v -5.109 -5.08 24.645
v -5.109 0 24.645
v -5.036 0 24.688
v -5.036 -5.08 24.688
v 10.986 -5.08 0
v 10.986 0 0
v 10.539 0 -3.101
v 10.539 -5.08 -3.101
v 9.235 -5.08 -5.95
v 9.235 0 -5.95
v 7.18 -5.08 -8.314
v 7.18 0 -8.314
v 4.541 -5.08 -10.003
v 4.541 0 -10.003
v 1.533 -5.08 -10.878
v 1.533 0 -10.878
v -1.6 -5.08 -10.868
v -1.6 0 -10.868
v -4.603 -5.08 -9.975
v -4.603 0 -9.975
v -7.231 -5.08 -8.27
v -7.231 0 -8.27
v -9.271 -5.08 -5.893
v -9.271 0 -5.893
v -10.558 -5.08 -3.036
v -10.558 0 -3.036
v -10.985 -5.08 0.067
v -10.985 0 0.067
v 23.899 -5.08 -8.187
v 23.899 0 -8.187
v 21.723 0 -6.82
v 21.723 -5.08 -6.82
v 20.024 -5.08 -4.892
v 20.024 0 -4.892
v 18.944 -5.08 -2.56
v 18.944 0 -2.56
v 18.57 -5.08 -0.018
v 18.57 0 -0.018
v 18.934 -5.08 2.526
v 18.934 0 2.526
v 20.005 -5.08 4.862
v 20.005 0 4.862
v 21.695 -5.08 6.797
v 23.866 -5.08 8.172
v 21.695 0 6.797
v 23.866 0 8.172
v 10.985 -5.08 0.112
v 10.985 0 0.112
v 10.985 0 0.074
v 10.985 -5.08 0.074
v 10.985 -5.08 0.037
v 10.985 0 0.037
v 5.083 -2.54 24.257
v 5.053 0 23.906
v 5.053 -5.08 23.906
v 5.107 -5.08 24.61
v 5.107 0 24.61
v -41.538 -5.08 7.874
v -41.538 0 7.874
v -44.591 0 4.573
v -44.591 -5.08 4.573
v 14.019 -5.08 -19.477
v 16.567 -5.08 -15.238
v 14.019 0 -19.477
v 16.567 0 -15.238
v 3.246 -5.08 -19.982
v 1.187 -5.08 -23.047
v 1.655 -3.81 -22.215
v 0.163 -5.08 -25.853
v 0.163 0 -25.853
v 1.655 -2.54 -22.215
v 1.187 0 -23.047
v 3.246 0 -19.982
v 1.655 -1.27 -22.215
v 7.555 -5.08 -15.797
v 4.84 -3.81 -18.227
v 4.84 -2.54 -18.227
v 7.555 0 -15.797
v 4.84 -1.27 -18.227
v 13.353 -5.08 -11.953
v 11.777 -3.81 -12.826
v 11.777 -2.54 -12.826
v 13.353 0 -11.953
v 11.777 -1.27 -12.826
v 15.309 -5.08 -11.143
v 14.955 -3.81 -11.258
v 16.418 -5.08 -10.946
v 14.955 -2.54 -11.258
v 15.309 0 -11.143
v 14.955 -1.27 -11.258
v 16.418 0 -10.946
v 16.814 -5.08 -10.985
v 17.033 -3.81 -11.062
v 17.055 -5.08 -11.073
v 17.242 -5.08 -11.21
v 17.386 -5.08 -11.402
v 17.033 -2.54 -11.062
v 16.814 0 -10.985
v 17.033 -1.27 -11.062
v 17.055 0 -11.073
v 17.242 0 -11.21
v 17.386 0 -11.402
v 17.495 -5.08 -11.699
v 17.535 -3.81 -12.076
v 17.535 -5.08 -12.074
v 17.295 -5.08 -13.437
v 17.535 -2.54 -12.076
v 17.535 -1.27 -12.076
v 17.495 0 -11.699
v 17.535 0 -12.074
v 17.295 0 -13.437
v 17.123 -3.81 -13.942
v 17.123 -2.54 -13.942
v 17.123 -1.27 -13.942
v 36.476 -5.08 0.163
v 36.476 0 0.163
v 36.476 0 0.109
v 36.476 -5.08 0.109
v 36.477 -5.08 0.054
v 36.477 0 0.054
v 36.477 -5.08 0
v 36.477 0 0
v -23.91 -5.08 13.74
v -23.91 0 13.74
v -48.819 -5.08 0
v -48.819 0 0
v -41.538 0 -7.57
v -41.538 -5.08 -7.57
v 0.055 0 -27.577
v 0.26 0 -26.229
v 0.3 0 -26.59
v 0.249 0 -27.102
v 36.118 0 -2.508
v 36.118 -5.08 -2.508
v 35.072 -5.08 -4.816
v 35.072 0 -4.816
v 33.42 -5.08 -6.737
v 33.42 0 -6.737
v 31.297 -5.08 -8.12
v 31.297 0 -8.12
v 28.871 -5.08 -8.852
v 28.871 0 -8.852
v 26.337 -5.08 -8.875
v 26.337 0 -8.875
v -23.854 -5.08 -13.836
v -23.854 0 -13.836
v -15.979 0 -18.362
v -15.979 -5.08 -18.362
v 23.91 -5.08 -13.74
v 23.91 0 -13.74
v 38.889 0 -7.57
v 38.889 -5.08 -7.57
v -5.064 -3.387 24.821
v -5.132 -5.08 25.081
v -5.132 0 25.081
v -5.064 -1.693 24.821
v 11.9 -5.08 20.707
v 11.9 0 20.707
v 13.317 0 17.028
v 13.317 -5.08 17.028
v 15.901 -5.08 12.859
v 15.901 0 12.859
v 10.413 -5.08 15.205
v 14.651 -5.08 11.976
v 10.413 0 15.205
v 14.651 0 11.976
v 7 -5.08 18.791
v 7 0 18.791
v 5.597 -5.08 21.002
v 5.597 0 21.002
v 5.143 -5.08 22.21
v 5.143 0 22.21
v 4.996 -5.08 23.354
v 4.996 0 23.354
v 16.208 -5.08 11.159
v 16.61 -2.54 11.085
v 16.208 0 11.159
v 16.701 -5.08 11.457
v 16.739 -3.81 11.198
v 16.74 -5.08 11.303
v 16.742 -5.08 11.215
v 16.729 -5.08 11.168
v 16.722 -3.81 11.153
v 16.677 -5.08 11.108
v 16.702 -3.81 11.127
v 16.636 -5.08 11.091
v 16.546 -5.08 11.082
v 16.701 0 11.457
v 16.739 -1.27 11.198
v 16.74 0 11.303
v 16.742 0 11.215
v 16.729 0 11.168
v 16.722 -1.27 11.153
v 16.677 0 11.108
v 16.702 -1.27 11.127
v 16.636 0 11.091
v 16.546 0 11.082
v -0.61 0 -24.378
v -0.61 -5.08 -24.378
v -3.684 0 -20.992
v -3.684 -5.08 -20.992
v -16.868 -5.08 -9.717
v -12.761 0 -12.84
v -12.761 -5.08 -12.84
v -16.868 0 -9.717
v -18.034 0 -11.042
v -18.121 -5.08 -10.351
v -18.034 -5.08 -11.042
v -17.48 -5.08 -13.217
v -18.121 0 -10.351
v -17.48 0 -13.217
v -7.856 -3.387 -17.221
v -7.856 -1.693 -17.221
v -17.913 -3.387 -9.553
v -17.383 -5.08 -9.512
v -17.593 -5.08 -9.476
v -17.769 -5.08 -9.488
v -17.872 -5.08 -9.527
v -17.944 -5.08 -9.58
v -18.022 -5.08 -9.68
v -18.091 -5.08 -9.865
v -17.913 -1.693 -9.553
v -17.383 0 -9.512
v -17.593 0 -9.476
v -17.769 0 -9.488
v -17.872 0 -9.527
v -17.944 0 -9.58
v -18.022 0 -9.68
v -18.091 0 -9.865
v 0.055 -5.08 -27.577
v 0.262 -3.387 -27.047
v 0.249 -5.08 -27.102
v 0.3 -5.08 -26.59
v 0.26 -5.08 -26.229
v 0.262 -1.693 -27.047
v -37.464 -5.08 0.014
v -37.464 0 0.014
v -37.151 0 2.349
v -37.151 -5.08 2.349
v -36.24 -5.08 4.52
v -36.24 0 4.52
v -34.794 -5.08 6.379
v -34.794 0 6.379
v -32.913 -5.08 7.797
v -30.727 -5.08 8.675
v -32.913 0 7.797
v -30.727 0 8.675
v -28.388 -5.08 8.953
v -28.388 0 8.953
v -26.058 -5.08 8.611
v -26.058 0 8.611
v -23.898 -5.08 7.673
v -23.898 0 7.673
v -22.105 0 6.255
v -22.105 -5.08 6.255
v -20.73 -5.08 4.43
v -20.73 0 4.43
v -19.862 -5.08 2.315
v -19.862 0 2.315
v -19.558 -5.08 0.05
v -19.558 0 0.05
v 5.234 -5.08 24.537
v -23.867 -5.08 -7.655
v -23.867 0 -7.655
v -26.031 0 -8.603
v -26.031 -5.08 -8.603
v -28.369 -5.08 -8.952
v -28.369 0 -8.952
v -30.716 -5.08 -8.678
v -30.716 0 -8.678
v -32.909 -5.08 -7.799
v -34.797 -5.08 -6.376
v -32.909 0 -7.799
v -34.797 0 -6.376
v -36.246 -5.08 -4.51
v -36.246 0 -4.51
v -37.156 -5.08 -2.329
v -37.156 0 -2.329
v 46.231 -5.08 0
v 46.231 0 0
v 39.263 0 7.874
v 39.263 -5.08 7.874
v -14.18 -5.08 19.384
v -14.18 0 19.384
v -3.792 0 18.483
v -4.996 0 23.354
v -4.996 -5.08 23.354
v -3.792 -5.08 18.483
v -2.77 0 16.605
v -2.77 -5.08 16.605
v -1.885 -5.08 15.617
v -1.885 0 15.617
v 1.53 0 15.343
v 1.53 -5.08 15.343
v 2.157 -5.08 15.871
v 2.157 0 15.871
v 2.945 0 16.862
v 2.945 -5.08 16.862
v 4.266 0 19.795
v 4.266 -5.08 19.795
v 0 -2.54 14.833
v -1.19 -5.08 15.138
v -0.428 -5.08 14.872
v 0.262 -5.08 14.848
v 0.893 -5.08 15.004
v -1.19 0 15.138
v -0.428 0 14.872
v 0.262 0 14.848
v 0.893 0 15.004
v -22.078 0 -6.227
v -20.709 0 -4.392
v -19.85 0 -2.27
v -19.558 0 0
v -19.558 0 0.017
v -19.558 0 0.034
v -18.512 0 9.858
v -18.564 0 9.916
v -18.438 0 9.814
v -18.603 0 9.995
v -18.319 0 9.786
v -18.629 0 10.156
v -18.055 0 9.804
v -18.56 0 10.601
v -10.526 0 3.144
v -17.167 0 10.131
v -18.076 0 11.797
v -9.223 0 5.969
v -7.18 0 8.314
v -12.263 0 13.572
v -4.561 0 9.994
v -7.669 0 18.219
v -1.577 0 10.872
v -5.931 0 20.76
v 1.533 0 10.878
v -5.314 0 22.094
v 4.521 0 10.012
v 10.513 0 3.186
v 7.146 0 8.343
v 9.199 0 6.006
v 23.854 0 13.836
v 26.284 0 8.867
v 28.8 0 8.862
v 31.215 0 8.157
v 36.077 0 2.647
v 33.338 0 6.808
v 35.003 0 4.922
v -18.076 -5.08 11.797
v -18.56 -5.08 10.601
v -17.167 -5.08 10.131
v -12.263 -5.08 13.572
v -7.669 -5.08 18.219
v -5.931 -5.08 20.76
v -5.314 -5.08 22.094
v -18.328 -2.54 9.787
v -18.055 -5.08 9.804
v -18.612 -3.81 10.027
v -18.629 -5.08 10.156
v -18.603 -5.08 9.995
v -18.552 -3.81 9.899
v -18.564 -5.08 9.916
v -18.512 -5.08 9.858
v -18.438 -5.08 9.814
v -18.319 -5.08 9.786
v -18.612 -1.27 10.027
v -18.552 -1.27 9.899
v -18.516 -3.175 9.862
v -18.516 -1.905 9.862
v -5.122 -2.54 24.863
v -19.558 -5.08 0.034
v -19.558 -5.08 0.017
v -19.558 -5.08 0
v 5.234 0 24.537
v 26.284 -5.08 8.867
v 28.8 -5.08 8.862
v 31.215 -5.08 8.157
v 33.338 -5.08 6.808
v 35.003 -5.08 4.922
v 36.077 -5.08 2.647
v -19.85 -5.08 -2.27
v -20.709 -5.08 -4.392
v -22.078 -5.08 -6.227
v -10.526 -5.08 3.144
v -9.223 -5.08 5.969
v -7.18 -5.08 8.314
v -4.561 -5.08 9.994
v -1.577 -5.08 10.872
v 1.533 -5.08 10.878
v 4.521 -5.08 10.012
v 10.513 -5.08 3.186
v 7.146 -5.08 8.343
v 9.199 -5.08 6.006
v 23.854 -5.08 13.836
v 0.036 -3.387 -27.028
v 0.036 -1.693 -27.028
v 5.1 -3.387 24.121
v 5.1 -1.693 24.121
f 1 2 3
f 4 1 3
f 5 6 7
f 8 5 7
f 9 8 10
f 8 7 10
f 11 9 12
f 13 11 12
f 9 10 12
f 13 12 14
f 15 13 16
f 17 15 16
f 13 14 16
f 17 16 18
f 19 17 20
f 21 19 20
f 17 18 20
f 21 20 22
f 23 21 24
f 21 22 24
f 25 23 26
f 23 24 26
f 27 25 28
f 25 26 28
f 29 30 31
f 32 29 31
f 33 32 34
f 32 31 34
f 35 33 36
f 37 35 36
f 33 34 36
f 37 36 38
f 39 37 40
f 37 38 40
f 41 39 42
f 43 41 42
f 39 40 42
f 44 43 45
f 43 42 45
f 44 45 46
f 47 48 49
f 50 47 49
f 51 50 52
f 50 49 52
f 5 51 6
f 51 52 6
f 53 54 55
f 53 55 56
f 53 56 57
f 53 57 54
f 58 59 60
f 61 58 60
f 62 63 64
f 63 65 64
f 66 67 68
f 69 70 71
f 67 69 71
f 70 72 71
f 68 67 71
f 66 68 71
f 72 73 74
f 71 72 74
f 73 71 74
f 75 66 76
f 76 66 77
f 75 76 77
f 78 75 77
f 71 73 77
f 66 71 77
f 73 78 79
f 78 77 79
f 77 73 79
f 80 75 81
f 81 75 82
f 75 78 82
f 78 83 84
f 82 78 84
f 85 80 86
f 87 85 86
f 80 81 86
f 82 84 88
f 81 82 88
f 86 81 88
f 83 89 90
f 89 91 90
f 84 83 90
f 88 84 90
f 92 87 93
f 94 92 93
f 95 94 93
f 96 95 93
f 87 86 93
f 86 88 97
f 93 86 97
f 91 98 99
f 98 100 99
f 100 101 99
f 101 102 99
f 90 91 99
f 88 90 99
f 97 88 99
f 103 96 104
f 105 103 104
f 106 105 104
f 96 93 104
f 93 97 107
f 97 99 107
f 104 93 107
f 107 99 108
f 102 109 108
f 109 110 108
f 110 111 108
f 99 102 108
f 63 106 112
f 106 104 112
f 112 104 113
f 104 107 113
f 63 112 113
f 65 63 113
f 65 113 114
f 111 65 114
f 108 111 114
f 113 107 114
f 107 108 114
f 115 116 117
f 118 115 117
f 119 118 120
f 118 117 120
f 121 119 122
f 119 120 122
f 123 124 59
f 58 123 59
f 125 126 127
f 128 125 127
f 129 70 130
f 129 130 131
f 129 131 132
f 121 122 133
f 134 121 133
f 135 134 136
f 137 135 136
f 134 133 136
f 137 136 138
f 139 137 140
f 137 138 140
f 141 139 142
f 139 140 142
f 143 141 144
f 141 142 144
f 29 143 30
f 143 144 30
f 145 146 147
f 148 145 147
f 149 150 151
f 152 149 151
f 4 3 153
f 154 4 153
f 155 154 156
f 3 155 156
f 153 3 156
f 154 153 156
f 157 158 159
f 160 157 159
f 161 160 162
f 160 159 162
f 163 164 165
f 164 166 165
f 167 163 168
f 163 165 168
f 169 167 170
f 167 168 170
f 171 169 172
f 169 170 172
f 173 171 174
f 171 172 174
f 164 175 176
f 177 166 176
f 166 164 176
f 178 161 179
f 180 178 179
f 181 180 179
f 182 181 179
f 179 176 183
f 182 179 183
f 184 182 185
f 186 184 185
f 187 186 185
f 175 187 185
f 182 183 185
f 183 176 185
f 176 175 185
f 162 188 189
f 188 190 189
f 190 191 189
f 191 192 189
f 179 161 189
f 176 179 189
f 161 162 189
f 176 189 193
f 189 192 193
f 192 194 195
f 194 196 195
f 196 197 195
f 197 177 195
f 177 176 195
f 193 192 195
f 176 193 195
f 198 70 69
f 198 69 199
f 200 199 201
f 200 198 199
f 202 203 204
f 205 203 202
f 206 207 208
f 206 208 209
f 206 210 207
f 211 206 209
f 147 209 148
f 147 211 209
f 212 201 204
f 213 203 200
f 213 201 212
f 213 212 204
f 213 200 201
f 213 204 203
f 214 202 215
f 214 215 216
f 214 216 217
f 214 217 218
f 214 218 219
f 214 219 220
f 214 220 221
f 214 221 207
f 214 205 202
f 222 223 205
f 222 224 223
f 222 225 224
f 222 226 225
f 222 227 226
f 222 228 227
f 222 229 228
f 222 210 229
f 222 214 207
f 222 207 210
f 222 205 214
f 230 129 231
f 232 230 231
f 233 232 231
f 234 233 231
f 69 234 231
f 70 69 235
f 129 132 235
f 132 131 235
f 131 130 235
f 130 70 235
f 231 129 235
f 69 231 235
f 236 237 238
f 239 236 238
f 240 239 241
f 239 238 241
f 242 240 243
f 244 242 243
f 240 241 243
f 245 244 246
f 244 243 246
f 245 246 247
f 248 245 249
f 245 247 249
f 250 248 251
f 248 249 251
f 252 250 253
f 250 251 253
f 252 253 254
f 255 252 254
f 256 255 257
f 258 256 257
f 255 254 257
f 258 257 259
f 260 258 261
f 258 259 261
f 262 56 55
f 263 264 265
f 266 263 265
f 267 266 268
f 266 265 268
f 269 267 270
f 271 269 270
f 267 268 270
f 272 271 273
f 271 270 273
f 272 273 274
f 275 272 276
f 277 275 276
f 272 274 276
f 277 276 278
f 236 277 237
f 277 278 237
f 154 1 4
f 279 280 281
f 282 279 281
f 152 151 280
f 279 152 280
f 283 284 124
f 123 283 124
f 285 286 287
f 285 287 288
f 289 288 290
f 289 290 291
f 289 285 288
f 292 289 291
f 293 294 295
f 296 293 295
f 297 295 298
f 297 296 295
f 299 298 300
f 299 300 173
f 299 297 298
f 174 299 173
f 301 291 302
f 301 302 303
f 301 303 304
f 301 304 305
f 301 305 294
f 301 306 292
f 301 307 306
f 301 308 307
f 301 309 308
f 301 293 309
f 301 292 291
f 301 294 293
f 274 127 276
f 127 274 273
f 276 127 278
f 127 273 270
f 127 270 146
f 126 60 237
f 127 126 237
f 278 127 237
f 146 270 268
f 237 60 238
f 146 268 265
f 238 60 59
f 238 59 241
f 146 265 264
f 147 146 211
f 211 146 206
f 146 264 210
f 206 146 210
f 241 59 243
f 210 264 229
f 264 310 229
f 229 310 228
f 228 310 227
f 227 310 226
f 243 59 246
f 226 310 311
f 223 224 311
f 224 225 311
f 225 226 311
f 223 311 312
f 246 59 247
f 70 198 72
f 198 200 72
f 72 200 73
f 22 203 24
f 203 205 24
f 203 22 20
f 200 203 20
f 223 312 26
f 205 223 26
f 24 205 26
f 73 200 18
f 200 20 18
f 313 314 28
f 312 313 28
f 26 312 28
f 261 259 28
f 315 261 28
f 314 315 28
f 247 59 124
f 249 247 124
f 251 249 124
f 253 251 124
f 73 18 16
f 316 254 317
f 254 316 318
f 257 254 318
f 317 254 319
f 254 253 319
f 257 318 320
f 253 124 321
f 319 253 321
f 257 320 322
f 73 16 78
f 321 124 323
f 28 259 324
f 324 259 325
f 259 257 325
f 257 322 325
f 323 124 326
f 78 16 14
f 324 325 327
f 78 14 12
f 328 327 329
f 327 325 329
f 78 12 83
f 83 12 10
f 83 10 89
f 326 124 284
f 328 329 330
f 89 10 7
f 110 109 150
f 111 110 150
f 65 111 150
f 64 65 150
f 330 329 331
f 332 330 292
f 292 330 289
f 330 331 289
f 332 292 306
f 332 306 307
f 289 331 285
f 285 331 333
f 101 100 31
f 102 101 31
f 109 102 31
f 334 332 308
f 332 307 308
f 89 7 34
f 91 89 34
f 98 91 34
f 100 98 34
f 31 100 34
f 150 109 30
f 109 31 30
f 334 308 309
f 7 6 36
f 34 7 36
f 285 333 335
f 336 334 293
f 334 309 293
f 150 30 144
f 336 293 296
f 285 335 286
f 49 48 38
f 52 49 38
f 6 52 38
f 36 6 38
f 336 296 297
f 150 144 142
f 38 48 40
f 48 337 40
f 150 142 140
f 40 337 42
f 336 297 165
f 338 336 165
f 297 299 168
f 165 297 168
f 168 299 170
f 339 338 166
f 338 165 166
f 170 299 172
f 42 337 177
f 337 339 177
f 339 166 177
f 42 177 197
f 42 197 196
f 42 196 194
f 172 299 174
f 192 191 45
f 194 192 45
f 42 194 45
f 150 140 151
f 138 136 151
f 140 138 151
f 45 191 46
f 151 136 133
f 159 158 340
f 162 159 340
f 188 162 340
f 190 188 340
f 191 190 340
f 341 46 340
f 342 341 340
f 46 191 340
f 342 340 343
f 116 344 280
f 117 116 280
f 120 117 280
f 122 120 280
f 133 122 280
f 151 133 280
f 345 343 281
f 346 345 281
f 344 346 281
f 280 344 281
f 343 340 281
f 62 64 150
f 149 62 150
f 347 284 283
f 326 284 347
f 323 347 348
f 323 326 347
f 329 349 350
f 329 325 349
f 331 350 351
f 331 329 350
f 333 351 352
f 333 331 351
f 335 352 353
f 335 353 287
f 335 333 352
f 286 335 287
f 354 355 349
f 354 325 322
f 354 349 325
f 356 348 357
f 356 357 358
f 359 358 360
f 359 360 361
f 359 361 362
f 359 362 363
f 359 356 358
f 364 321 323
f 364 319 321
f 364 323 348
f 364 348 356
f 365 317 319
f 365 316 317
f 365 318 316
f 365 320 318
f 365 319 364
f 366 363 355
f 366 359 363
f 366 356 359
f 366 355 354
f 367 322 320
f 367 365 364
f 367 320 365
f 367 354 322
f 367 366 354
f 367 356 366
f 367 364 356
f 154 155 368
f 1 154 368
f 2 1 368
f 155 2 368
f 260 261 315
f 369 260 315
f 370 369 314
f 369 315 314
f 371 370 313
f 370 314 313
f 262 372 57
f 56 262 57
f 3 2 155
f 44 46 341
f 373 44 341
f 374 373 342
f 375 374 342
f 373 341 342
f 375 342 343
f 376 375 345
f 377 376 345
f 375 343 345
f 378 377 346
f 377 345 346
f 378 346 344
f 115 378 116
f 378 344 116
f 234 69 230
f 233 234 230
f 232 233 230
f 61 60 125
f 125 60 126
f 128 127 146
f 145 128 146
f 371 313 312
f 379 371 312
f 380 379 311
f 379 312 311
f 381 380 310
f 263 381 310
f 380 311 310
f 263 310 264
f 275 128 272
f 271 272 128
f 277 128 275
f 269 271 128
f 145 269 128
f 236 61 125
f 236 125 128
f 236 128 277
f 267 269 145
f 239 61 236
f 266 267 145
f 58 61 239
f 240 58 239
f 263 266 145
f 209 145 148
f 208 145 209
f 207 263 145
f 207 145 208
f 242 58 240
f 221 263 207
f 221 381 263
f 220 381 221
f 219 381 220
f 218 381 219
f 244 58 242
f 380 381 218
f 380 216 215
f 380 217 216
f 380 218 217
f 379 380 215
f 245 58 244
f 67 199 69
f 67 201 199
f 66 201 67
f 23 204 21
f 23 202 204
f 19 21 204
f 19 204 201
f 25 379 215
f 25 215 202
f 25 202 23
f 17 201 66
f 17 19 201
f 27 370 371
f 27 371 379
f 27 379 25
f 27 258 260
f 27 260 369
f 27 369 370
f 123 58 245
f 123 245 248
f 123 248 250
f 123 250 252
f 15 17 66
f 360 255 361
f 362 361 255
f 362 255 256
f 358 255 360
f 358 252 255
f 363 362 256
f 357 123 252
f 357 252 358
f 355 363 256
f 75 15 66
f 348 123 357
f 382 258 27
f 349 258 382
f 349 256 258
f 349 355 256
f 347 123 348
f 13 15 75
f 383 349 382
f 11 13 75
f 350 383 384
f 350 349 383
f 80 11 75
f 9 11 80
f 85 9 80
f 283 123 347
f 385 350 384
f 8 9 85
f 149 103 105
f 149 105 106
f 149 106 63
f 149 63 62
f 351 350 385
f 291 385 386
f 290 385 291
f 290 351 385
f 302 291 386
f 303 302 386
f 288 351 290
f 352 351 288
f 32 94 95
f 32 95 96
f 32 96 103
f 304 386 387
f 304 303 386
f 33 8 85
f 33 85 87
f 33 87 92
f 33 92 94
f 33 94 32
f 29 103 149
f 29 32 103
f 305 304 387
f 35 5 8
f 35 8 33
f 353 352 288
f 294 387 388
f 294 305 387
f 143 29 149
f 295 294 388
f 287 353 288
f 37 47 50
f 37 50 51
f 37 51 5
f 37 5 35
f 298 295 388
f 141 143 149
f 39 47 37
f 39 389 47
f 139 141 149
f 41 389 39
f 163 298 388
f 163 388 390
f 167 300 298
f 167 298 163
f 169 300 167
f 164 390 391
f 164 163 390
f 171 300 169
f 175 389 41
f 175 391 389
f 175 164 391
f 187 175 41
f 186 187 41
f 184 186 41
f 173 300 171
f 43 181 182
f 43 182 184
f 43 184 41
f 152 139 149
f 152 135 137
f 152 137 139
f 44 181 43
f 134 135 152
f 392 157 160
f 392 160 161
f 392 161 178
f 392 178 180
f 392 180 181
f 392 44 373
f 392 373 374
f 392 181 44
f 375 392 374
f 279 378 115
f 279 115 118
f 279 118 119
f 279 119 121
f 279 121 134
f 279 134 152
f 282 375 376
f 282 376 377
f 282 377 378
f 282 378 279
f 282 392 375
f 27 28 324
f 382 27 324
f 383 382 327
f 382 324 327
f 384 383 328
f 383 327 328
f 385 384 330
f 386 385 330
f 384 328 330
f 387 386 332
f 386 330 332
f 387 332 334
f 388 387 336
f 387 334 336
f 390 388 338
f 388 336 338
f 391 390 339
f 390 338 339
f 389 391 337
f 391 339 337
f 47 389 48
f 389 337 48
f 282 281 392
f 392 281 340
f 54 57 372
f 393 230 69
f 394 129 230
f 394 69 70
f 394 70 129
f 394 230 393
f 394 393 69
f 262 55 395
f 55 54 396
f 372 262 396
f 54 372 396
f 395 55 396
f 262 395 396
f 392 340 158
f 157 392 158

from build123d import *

# Parameters (mm, degrees)
F1_DEPTH = 5.08


with BuildPart() as f1:
    # F0 (on Front) → F1 (new body)
    with BuildSketch(Plane.XZ):
        with BuildLine():
            Line((23.8544226128, 13.8363139495), (11.8995172721, 20.7065034498))
            add(Edge.make_bspline(
                [(11.8995172721, 20.7065034498), (12.7527047238, 16.3214990301), (23.6984449015, 4.8622046649), (4.8911049153, 18.4580126576), (4.9955159434, 23.3538565741)],
                knots=[0, 0, 0, 0, 0.2510815361, 0.566393336, 0.566393336, 0.566393336, 0.566393336], degree=3))
            add(Edge.make_bspline(
                [(-4.9955159434, 23.3538565741), (-4.0065950779, 14.8329585791), (0, 14.8329585791), (4.0065950779, 14.8329585791), (4.9955159434, 23.3538565741)],
                knots=[1.8201970434, 1.8201970434, 1.8201970434, 3.1415926536, 3.1415926536, 4.4629882638, 4.4629882638, 4.4629882638], degree=2, weights=[1, 0.7895642031, 1, 0.7895642031, 1]))
            add(Edge.make_bspline(
                [(-14.1796024948, 19.3842051979), (-16.1087852311, 14.8596253569), (-24.5159632533, 3.3211353455), (-5.6744217692, 18.0019188802), (-4.9955159434, 23.3538565741)],
                knots=[0, 0, 0, 0, 0.2419326445, 0.5682555357, 0.5682555357, 0.5682555357, 0.5682555357], degree=3))
            Line((-14.1796024948, 19.3842051979), (-23.9098106814, 13.7403790006))
            Line((-23.9098106814, 13.7403790006), (-23.8976251995, 7.6734533511))
            ThreePointArc((-23.8976251995, 7.6734533511), (-20.730112215, 4.4297703221), (-19.5576464714, 0.0502792352))
            Line((-19.5576464714, 0.0502792352), (-10.9852926415, 0.0674968952))
            ThreePointArc((-10.9852926415, 0.0674968952), (-0.0220644441, 10.9854778417), (10.9849328747, 0.1116243169))
            Line((10.9849328747, 0.1116243169), (18.5708946822, 0.1268607984))
            ThreePointArc((18.5708946822, 0.1268607984), (20.0443809343, 4.922194791), (23.8657988515, 8.1722955491))
            Line((23.8657988515, 8.1722955491), (23.8544226128, 13.8363139495))
        make_face()
        with BuildLine():
            Line((39.2630137504, 7.8735761344), (23.8544226128, 13.8363139495))
            Line((23.8544226128, 13.8363139495), (23.8657988515, 8.1722955491))
            ThreePointArc((23.8657988515, 8.1722955491), (32.3240559978, 7.557763228), (36.4755152887, 0.1628224112))
            Line((36.4755152887, 0.1628224112), (41.5712800692, 0.1730573066))
            Line((41.5712800692, 0.1730573066), (41.5622201778, 4.6838093397))
            Line((41.5622201778, 4.6838093397), (39.2630137504, 7.8735761344))
        make_face()
        Polygon((46.2305024266, 0), (39.2630137504, 7.8735761344), (41.5622201778, 4.6838093397), (41.5712800692, 0.1730573066), (41.5716276565, 0), (38.8891281875, -7.569654379), align=None)
        with BuildLine():
            Line((41.5712800692, 0.1730573066), (36.4755152887, 0.1628224112))
            ThreePointArc((36.4755152887, 0.1628224112), (36.4766257405, 0.0814145715), (36.4769959013, 0))
            ThreePointArc((36.4769959013, 0), (32.4076622958, -7.504004323), (23.8986565077, -8.1869225977))
            Line((23.8986565077, -8.1869225977), (23.9098106814, -13.7403790006))
            Line((23.9098106814, -13.7403790006), (38.8891281875, -7.569654379))
            Line((38.8891281875, -7.569654379), (41.5716276565, 0))
            Line((41.5716276565, 0), (41.5712800692, 0.1730573066))
        make_face()
        with BuildLine():
            ThreePointArc((23.8986565077, -8.1869225977), (19.9850775207, -4.830880931), (18.5708946822, 0.1268607984))
            Line((18.5708946822, 0.1268607984), (10.9849328747, 0.1116243169))
            ThreePointArc((10.9849328747, 0.1116243169), (10.9853582178, 0.0558128788), (10.9855, 0))
            ThreePointArc((10.9855, 0), (-0.0337486069, -10.9854481602), (-10.9852926415, 0.0674968952))
            Line((-10.9852926415, 0.0674968952), (-19.5576464714, 0.0502792352))
            ThreePointArc((-19.5576464714, 0.0502792352), (-19.5575405901, 0.0251397167), (-19.5575052963, 0))
            ThreePointArc((-19.5575052963, 0), (-20.7088673521, -4.3922438172), (-23.8668381271, -7.6548594732))
            Line((-23.8668381271, -7.6548594732), (-23.8544226128, -13.8363139495))
            Line((-23.8544226128, -13.8363139495), (-15.9790920253, -18.3620723701))
            add(Edge.make_bspline(
                [(0.163388369, -25.8532824823), (-0.5824883081, -23.5445287745), (-8.8142073886, -16.5809605771), (-20.7736627649, -5.1912645148), (-16.9995624931, -14.3564310957), (-15.9790920253, -18.3620723701)],
                knots=[0.0461674631, 0.0461674631, 0.0461674631, 0.0461674631, 0.2131983653, 0.4232173263, 0.6005724186, 0.6005724186, 0.6005724186, 0.6005724186], degree=3))
            add(Edge.make_bspline(
                [(0.163388369, -25.8532824823), (0.5984234349, -23.6166229337), (4.4335734026, -16.9603900208), (20.3472971341, -7.0641553228), (16.8185248338, -15.4600803358), (14.0872810007, -19.3800999399), (14.0188094193, -19.4774702293)],
                knots=[0.0441354144, 0.0441354144, 0.0441354144, 0.0441354144, 0.2056976035, 0.4443926766, 0.6304870786, 0.6352232986, 0.6352232986, 0.6352232986, 0.6352232986], degree=3))
            Line((14.0188094193, -19.4774702293), (23.9098106814, -13.7403790006))
            Line((23.9098106814, -13.7403790006), (23.8986565077, -8.1869225977))
        make_face()
        with BuildLine():
            Line((-23.8976251995, 7.6734533511), (-23.9098106814, 13.7403790006))
            Line((-23.9098106814, 13.7403790006), (-41.5380969644, 7.8735761344))
            Line((-41.5380969644, 7.8735761344), (-44.5907459629, 4.5725049953))
            Line((-44.5907459629, 4.5725049953), (-44.5907459629, 0))
            Line((-44.5907459629, 0), (-37.4644938557, 0.0143131499))
            ThreePointArc((-37.4644938557, 0.0143131499), (-32.9126802641, 7.7968211297), (-23.8976251995, 7.6734533511))
        make_face()
        with BuildLine():
            ThreePointArc((-23.8668381271, -7.6548594732), (-32.9094839983, -7.7986247094), (-37.4644938557, 0.0143131499))
            Line((-37.4644938557, 0.0143131499), (-44.5907459629, 0))
            Line((-44.5907459629, 0), (-44.5907459629, -2.3883581161))
            Line((-44.5907459629, -2.3883581161), (-41.5380969644, -7.569654379))
            Line((-41.5380969644, -7.569654379), (-23.8544226128, -13.8363139495))
            Line((-23.8544226128, -13.8363139495), (-23.8668381271, -7.6548594732))
        make_face()
        Polygon((-44.5907459629, 0), (-44.5907459629, 4.5725049953), (-48.8191470504, 0), (-41.5380969644, -7.569654379), (-44.5907459629, -2.3883581161), align=None)
    extrude(amount=F1_DEPTH)


with BuildPart() as f1b:
    # F0 (on Front) → F1, piece 2 (new body)
    with BuildSketch(Plane.XZ):
        with BuildLine():
            add(Edge.make_bspline(
                [(5.05297105, 23.9064308163), (5.0935955947, 24.1228884346), (5.1546696758, 24.333291686), (5.2336305106, 24.5372243074)],
                knots=[0.5785155836, 0.5785155836, 0.5785155836, 0.5785155836, 0.5930865518, 0.5930865518, 0.5930865518, 0.5930865518], degree=3))
            Line((5.2336305106, 24.5372243074), (5.1072520142, 24.609850915))
            add(Edge.make_bspline(
                [(5.05297105, 23.9064308163), (5.085167197, 24.2562618556), (5.1072520142, 24.609850915)],
                knots=[4.5130919957, 4.5130919957, 4.5130919957, 4.5761642718, 4.5761642718, 4.5761642718], degree=2, weights=[1, 0.9995027772, 1]))
        make_face()
    extrude(amount=F1_DEPTH)


with BuildPart() as f1c:
    # F0 (on Front) → F1, piece 3 (new body)
    with BuildSketch(Plane.XZ):
        with BuildLine():
            add(Edge.make_bspline(
                [(-5.1321122684, 25.0811244519), (-5.1226991178, 24.8626735882), (-5.1094332892, 24.6451880664)],
                knots=[1.6650830677, 1.6650830677, 1.6650830677, 1.7038689923, 1.7038689923, 1.7038689923], degree=2, weights=[1, 0.9998119624, 1]))
            Line((-5.1094332892, 24.6451880664), (-5.0355162164, 24.688062289))
            add(Edge.make_bspline(
                [(-5.0355162164, 24.688062289), (-5.0614762451, 24.822005601), (-5.0938469313, 24.9530733475), (-5.1321122684, 25.0811244519)],
                knots=[0.596906543, 0.596906543, 0.596906543, 0.596906543, 0.6060843122, 0.6060843122, 0.6060843122, 0.6060843122], degree=3))
        make_face()
    extrude(amount=F1_DEPTH)


with BuildPart() as f1d:
    # F0 (on Front) → F1, piece 4 (new body)
    with BuildSketch(Plane.XZ):
        with BuildLine():
            add(Edge.make_bspline(
                [(0.0553880686, -27.5766929501), (0.0087635928, -27.0417101596), (0.0445458786, -26.464291138), (0.163388369, -25.8532824823)],
                knots=[0, 0, 0, 0, 0.0441354144, 0.0441354144, 0.0441354144, 0.0441354144], degree=3))
            add(Edge.make_bspline(
                [(0.0553880686, -27.5766929501), (0.3541021804, -27.0702754536), (0.3695492259, -26.4914236891), (0.163388369, -25.8532824823)],
                knots=[0, 0, 0, 0, 0.0461674631, 0.0461674631, 0.0461674631, 0.0461674631], degree=3))
        make_face()
    extrude(amount=F1_DEPTH)


solid = Compound([f1.part, f1b.part, f1c.part, f1d.part])
